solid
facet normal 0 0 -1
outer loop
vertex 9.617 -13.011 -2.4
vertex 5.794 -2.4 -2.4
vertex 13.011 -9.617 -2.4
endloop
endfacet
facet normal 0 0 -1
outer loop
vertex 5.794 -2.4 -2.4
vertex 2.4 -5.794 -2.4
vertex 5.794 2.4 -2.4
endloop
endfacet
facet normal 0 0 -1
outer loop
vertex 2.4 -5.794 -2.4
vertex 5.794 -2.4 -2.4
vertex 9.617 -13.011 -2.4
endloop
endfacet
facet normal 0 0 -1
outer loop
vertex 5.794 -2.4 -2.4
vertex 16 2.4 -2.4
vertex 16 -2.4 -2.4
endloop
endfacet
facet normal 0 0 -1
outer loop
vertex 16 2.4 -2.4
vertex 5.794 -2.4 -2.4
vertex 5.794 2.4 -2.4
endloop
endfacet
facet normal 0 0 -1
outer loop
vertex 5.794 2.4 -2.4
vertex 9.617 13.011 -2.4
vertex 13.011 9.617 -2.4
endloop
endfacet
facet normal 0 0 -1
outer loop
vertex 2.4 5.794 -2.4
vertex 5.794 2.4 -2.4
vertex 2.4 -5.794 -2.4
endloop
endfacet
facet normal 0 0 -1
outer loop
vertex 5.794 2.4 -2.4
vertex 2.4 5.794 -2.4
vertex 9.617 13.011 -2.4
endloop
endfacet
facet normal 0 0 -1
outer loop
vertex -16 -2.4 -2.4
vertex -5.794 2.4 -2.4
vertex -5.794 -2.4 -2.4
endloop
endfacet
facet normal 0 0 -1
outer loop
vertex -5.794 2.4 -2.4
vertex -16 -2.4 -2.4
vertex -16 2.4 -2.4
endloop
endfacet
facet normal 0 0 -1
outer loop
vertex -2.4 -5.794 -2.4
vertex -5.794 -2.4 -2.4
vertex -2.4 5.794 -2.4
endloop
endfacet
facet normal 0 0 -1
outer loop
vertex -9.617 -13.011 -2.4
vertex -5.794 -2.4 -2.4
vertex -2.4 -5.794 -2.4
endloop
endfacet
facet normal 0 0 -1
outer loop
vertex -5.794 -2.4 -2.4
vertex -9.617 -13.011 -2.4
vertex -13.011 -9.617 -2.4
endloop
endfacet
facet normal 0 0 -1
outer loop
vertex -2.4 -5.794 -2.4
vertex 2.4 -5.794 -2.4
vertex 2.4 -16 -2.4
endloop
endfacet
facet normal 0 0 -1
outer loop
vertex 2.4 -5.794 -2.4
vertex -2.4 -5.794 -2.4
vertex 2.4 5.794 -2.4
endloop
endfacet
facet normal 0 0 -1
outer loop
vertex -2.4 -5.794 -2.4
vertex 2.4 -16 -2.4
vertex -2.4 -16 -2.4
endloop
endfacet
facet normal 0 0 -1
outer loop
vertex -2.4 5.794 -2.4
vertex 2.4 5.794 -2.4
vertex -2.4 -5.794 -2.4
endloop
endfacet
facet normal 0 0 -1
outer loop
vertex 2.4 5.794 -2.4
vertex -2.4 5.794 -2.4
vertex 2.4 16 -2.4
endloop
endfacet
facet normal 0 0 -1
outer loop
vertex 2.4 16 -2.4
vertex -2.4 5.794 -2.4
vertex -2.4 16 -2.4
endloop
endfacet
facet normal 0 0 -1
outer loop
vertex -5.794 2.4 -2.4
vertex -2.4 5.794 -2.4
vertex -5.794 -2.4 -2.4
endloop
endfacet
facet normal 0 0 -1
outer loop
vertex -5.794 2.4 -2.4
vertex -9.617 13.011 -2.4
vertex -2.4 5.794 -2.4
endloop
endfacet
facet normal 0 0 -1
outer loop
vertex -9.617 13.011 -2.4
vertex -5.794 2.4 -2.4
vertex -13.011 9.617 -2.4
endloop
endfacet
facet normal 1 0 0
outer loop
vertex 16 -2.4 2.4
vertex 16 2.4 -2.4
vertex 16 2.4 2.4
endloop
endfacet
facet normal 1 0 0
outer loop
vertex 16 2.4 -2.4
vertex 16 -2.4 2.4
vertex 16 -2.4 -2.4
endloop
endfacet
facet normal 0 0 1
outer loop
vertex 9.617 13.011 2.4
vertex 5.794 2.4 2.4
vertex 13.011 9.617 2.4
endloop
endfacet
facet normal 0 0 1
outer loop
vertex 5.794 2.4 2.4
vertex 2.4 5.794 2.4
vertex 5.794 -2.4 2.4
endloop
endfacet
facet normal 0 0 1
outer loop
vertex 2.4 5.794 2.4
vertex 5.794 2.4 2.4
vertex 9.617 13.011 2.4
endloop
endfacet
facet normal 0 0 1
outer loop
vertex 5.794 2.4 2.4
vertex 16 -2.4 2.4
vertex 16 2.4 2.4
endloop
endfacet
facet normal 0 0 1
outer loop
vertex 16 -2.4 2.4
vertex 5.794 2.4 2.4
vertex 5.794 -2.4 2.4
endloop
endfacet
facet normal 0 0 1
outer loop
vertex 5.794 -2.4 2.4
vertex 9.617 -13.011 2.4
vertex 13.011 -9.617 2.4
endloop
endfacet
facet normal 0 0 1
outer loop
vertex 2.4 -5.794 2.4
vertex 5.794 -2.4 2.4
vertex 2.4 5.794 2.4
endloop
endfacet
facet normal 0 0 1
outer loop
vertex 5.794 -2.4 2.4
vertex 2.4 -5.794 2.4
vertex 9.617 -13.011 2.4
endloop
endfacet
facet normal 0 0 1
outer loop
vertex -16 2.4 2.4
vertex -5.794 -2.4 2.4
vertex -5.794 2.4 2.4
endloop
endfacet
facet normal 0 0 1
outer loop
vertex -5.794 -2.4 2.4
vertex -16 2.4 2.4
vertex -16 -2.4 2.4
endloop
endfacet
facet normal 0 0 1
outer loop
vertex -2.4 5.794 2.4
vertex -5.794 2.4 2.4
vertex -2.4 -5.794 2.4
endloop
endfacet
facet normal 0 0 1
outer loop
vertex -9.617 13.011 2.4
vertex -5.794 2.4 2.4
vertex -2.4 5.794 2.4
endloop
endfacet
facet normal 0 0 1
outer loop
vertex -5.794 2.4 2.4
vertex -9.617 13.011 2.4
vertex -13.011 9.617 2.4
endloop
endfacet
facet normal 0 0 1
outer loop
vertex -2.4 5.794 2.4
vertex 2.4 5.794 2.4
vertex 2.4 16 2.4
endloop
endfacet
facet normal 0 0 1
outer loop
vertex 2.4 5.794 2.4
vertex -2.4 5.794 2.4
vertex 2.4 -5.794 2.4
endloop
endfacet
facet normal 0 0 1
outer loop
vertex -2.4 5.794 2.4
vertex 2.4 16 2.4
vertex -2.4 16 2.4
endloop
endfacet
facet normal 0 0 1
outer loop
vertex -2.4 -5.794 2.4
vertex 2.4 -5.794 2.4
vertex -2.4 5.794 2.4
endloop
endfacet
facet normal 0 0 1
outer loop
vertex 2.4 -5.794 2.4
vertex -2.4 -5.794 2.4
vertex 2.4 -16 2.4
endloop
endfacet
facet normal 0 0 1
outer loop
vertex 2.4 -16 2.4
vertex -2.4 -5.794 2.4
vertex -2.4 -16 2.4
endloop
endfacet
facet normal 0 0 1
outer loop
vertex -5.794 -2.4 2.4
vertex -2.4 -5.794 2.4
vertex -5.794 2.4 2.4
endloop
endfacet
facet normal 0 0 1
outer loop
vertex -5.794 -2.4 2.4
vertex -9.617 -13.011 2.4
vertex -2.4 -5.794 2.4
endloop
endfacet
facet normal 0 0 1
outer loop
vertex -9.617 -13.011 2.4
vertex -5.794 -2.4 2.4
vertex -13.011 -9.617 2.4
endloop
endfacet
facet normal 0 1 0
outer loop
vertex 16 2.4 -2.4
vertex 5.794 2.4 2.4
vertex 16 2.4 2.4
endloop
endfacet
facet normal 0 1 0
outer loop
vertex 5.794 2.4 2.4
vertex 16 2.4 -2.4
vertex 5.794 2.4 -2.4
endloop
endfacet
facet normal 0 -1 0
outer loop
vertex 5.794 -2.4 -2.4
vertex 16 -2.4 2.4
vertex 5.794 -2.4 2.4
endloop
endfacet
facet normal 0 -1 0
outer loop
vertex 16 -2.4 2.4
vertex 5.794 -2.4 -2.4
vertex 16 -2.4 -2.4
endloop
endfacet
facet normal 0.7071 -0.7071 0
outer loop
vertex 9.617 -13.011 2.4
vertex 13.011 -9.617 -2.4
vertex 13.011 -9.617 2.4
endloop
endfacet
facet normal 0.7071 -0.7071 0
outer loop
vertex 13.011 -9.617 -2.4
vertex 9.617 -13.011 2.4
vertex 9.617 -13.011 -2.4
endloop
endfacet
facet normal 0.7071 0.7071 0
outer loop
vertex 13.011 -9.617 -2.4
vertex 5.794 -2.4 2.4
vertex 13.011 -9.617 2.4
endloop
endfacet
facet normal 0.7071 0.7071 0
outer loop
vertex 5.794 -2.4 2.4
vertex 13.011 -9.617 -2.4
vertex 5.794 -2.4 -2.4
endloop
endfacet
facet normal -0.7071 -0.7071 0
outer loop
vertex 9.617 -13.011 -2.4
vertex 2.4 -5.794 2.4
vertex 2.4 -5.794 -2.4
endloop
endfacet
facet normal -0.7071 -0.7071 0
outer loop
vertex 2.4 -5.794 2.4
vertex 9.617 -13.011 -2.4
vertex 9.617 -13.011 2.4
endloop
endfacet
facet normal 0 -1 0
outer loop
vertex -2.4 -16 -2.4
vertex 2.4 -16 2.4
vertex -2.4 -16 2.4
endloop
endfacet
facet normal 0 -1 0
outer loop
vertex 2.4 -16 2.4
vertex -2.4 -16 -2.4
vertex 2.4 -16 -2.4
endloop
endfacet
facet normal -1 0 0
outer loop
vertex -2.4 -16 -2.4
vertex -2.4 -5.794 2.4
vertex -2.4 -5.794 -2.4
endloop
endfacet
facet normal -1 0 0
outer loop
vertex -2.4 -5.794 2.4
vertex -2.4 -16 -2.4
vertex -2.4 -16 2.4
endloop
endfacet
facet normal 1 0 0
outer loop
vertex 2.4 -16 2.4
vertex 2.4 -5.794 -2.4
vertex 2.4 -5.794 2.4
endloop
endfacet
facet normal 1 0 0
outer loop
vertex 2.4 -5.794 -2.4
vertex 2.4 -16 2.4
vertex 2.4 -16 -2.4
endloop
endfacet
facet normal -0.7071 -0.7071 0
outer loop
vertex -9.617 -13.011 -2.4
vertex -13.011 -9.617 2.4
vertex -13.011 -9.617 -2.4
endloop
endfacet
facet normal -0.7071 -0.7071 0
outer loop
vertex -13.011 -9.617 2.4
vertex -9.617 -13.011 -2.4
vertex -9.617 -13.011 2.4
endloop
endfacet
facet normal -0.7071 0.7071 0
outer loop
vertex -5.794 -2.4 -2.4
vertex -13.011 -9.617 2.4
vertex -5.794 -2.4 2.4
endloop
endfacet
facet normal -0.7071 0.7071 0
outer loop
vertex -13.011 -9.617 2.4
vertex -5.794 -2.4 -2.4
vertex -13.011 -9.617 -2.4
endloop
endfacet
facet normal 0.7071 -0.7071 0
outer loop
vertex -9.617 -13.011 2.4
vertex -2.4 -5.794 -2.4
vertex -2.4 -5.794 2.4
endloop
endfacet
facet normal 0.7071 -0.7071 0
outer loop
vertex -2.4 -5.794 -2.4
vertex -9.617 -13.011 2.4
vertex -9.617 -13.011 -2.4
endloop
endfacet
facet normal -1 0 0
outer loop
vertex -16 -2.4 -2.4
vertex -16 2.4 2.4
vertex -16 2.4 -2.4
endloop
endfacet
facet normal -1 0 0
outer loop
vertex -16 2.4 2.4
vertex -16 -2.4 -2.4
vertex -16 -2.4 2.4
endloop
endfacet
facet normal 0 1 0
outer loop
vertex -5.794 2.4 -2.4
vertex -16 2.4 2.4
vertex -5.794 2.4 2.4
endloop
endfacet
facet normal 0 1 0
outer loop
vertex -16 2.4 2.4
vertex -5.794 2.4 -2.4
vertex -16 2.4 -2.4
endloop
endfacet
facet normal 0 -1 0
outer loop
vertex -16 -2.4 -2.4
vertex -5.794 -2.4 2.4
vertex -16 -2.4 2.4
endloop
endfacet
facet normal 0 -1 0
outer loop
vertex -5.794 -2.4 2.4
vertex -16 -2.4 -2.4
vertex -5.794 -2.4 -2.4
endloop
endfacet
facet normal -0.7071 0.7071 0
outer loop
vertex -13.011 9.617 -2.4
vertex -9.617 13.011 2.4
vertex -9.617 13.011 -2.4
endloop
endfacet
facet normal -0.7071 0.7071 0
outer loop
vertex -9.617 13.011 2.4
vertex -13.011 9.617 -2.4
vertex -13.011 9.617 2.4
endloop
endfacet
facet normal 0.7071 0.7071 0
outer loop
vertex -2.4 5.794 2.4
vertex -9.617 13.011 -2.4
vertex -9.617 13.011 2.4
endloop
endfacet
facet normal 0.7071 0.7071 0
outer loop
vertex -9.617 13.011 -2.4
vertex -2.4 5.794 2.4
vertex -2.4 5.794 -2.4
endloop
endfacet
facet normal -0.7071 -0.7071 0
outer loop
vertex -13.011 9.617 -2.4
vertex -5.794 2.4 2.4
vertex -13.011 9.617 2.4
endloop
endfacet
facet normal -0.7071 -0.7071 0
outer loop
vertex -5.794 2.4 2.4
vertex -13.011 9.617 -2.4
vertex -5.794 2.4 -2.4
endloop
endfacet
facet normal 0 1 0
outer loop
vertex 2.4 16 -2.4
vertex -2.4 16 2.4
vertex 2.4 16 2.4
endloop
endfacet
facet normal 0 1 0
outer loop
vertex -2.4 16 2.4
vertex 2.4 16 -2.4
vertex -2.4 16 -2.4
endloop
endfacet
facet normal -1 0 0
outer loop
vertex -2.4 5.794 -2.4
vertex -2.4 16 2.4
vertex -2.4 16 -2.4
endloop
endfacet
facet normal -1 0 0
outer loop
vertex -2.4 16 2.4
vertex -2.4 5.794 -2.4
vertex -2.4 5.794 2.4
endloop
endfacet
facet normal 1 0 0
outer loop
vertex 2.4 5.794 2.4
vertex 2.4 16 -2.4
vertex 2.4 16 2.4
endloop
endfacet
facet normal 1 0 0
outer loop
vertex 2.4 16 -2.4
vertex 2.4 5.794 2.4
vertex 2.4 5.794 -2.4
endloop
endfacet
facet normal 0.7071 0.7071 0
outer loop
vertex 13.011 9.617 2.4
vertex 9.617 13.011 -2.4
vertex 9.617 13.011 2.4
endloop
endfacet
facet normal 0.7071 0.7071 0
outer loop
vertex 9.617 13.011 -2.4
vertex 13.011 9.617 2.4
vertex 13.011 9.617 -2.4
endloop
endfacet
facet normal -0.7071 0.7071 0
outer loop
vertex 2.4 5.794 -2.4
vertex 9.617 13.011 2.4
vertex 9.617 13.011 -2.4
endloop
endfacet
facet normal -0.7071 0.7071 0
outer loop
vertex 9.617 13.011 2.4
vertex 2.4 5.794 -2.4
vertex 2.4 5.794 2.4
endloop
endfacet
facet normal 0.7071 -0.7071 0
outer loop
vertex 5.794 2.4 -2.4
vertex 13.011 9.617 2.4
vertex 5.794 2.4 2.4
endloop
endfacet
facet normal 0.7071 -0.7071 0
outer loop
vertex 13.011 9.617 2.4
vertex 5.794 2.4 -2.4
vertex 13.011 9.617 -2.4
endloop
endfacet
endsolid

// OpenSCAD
size = 32;//block=32 //item=8



end = 8;
for(curr = [0:1:end]) {
  rotate([0, 90, 0]) {
    rotate([360 / end * curr, 0, 0]) {
      translate([0, 0, size * 0.25]) {
        cube([size * 0.15, size * 0.15, size * 0.5], center = true);
      }
      ;//translate
    }
    ;//rotate
  }
  ;//rotate

}
;//for
